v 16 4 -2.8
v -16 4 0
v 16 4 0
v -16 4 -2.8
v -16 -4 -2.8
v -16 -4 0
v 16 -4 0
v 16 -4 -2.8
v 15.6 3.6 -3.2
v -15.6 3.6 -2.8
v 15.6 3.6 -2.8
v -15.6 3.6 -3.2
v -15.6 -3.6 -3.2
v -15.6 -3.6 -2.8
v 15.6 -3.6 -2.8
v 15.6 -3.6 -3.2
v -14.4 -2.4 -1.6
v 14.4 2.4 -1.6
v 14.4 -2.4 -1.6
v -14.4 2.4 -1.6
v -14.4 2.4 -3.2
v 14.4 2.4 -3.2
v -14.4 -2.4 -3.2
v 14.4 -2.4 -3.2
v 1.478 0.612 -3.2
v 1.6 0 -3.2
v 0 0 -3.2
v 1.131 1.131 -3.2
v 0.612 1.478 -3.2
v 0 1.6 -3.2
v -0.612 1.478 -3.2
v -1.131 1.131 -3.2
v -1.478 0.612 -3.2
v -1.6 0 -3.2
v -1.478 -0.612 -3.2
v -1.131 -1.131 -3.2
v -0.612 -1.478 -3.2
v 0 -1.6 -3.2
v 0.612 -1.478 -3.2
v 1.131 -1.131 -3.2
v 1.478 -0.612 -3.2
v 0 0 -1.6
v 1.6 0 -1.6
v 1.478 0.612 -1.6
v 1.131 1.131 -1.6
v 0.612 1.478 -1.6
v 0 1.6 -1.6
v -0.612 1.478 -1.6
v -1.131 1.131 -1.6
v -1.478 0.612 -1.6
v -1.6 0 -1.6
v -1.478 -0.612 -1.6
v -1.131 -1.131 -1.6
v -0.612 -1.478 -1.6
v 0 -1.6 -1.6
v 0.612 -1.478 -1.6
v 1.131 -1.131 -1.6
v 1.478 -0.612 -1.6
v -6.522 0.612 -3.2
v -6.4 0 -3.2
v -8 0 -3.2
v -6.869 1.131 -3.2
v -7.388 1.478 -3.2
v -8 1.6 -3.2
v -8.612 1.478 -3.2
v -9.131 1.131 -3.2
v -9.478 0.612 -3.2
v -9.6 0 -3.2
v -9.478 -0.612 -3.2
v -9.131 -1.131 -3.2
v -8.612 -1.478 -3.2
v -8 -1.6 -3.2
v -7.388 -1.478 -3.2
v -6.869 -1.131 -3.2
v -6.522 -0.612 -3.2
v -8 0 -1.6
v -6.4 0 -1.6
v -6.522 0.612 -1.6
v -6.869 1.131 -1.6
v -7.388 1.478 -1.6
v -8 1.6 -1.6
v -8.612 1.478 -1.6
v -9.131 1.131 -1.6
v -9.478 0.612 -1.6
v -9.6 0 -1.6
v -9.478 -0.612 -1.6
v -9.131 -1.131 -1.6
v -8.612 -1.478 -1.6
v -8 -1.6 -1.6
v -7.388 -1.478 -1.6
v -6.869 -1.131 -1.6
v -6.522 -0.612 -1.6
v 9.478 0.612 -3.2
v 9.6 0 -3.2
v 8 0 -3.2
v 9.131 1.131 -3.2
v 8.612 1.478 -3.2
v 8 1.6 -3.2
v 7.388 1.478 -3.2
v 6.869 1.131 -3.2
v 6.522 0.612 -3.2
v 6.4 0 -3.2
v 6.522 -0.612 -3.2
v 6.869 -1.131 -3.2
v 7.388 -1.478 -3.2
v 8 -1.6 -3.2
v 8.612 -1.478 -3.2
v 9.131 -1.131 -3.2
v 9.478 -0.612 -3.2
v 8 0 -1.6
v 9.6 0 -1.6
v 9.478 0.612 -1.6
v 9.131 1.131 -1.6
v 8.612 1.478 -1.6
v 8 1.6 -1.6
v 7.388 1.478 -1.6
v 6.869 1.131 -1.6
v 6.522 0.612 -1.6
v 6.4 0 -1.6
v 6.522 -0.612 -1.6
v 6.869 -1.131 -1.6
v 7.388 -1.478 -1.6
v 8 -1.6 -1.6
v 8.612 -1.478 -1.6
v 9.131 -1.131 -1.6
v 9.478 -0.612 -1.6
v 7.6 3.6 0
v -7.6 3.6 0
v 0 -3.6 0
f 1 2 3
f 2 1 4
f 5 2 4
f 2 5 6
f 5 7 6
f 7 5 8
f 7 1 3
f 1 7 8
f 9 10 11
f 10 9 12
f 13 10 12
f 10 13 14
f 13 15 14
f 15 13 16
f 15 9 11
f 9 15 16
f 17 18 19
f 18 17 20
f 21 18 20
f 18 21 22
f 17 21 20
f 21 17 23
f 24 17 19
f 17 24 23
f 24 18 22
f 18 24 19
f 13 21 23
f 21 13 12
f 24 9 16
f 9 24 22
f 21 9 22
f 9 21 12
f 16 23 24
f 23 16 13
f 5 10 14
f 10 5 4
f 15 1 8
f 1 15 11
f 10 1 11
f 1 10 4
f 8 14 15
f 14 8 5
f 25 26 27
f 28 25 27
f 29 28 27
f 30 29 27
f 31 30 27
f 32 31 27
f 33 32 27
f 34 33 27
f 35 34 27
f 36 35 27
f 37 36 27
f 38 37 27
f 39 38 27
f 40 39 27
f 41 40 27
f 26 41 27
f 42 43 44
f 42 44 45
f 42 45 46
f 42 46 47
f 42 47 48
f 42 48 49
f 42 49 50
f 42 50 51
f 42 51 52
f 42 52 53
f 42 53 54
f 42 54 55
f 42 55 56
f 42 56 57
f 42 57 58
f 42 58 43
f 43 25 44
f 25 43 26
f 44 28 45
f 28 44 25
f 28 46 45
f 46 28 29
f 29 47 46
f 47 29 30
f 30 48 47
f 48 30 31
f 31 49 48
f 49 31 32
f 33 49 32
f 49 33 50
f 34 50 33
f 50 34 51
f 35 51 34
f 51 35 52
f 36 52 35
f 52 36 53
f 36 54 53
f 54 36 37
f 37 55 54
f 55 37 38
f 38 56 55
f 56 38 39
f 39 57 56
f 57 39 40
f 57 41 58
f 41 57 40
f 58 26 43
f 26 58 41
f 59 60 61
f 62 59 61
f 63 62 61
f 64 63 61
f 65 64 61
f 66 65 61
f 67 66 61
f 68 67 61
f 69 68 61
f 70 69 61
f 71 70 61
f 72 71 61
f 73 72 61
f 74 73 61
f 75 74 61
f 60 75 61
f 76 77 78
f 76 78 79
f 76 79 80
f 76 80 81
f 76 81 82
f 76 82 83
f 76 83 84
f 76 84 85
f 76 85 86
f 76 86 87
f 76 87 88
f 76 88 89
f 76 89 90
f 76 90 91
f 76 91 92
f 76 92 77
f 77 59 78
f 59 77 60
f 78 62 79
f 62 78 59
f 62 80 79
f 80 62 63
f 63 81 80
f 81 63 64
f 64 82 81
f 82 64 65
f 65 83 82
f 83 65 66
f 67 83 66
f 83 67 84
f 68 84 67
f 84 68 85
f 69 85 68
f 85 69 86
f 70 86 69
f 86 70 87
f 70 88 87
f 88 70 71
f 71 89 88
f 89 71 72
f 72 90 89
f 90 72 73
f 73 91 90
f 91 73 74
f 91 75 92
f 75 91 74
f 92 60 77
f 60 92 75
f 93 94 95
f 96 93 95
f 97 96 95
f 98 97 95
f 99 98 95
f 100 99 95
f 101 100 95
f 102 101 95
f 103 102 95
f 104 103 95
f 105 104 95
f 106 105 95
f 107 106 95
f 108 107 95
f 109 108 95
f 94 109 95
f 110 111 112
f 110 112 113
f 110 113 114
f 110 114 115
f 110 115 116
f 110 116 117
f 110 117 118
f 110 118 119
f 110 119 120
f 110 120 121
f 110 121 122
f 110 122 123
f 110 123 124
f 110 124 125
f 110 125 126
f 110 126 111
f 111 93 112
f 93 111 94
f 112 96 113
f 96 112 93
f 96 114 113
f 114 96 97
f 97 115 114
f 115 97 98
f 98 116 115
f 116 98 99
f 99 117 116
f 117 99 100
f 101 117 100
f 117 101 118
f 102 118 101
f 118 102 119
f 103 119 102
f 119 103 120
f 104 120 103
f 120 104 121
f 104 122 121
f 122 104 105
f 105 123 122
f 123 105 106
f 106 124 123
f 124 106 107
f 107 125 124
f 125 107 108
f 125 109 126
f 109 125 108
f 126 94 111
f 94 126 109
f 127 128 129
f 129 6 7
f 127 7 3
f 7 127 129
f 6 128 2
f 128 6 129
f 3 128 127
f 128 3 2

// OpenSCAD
// file: ../p/4-4edge.scad
use <../lib.scad>
function ldraw_lib__4_4edge() = [
// 0 Circle 1.0
// 0 Name: 4-4edge.dat
// 0 Author: James Jessiman
// 0 !LDRAW_ORG Primitive UPDATE 2017-01
// 0 !LICENSE Licensed under CC BY 2.0 and CC BY 4.0 : see CAreadme.txt
// 
// 0 BFC CERTIFY CCW
  [0,"BFC","CERTIFY"],
  [0,"BFC","CCW"],
// 
// 0 !HISTORY 1998-12-15 [PTadmin] Official Update 1998-10
// 0 !HISTORY 2005-12-28 [PTadmin] Official Update 2005-01
// 0 !HISTORY 2007-06-24 [PTadmin] Header formatted for Contributor Agreement
// 0 !HISTORY 2008-07-01 [PTadmin] Official Update 2008-01
// 0 !HISTORY 2017-01-15 [Steffen] BFCed
// 0 !HISTORY 2017-12-30 [PTadmin] Official Update 2017-01
// 
// 
// 2 24 1 0 0 0.9239 0 0.3827
  [2,24,1,0,0,0.9239,0,0.3827],
// 2 24 0.9239 0 0.3827 0.7071 0 0.7071
  [2,24,0.9239,0,0.3827,0.7071,0,0.7071],
// 2 24 0.7071 0 0.7071 0.3827 0 0.9239
  [2,24,0.7071,0,0.7071,0.3827,0,0.9239],
// 2 24 0.3827 0 0.9239 0 0 1
  [2,24,0.3827,0,0.9239,0,0,1],
// 2 24 0 0 1 -0.3827 0 0.9239
  [2,24,0,0,1,-0.3827,0,0.9239],
// 2 24 -0.3827 0 0.9239 -0.7071 0 0.7071
  [2,24,-0.3827,0,0.9239,-0.7071,0,0.7071],
// 2 24 -0.7071 0 0.7071 -0.9239 0 0.3827
  [2,24,-0.7071,0,0.7071,-0.9239,0,0.3827],
// 2 24 -0.9239 0 0.3827 -1 0 -0
  [2,24,-0.9239,0,0.3827,-1,0,-0],
// 2 24 -1 0 -0 -0.9239 0 -0.3827
  [2,24,-1,0,-0,-0.9239,0,-0.3827],
// 2 24 -0.9239 0 -0.3827 -0.7071 0 -0.7071
  [2,24,-0.9239,0,-0.3827,-0.7071,0,-0.7071],
// 2 24 -0.7071 0 -0.7071 -0.3827 0 -0.9239
  [2,24,-0.7071,0,-0.7071,-0.3827,0,-0.9239],
// 2 24 -0.3827 0 -0.9239 0 0 -1
  [2,24,-0.3827,0,-0.9239,0,0,-1],
// 2 24 0 0 -1 0.3827 0 -0.9239
  [2,24,0,0,-1,0.3827,0,-0.9239],
// 2 24 0.3827 0 -0.9239 0.7071 0 -0.7071
  [2,24,0.3827,0,-0.9239,0.7071,0,-0.7071],
// 2 24 0.7071 0 -0.7071 0.9239 0 -0.3827
  [2,24,0.7071,0,-0.7071,0.9239,0,-0.3827],
// 2 24 0.9239 0 -0.3827 1 0 0
  [2,24,0.9239,0,-0.3827,1,0,0],
];
module ldraw_lib__4_4edge(step=0, col=false, unit=2/5, alt=false, line=0.2, solid=!$preview)
    makepoly(ldraw_lib__4_4edge(), step=step, col=col, unit=unit, alt=alt, line=line, solid=solid);
ldraw_lib__4_4edge(line=0.2);
// file: ../p/4-4disc.scad
use <../lib.scad>
function ldraw_lib__4_4disc() = [
// 0 Disc 1.0
// 0 Name: 4-4disc.dat
// 0 Author: James Jessiman
// 0 !LDRAW_ORG Primitive UPDATE 2002-02
// 0 !LICENSE Licensed under CC BY 2.0 and CC BY 4.0 : see CAreadme.txt
// 
// 0 BFC CERTIFY CCW
  [0,"BFC","CERTIFY"],
  [0,"BFC","CCW"],
// 
// 0 !HISTORY 1998-12-15 [PTadmin] Official Update 1998-10
// 0 !HISTORY 2002-03-23 [sbliss] Added BFC statement
// 0 !HISTORY 2002-04-25 [PTadmin] Official Update 2002-02
// 0 !HISTORY 2007-06-24 [PTadmin] Header formatted for Contributor Agreement
// 0 !HISTORY 2008-07-01 [PTadmin] Official Update 2008-01
// 
// 
// 3 16 0 0 0 1 0 0 0.9239 0 0.3827
  [3,16,0,0,0,1,0,0,0.9239,0,0.3827],
// 3 16 0 0 0 0.9239 0 0.3827 0.7071 0 0.7071
  [3,16,0,0,0,0.9239,0,0.3827,0.7071,0,0.7071],
// 3 16 0 0 0 0.7071 0 0.7071 0.3827 0 0.9239
  [3,16,0,0,0,0.7071,0,0.7071,0.3827,0,0.9239],
// 3 16 0 0 0 0.3827 0 0.9239 0 0 1
  [3,16,0,0,0,0.3827,0,0.9239,0,0,1],
// 3 16 0 0 0 0 0 1 -0.3827 0 0.9239
  [3,16,0,0,0,0,0,1,-0.3827,0,0.9239],
// 3 16 0 0 0 -0.3827 0 0.9239 -0.7071 0 0.7071
  [3,16,0,0,0,-0.3827,0,0.9239,-0.7071,0,0.7071],
// 3 16 0 0 0 -0.7071 0 0.7071 -0.9239 0 0.3827
  [3,16,0,0,0,-0.7071,0,0.7071,-0.9239,0,0.3827],
// 3 16 0 0 0 -0.9239 0 0.3827 -1 0 -0
  [3,16,0,0,0,-0.9239,0,0.3827,-1,0,-0],
// 3 16 0 0 0 -1 0 -0 -0.9239 0 -0.3827
  [3,16,0,0,0,-1,0,-0,-0.9239,0,-0.3827],
// 3 16 0 0 0 -0.9239 0 -0.3827 -0.7071 0 -0.7071
  [3,16,0,0,0,-0.9239,0,-0.3827,-0.7071,0,-0.7071],
// 3 16 0 0 0 -0.7071 0 -0.7071 -0.3827 0 -0.9239
  [3,16,0,0,0,-0.7071,0,-0.7071,-0.3827,0,-0.9239],
// 3 16 0 0 0 -0.3827 0 -0.9239 0 0 -1
  [3,16,0,0,0,-0.3827,0,-0.9239,0,0,-1],
// 3 16 0 0 0 0 0 -1 0.3827 0 -0.9239
  [3,16,0,0,0,0,0,-1,0.3827,0,-0.9239],
// 3 16 0 0 0 0.3827 0 -0.9239 0.7071 0 -0.7071
  [3,16,0,0,0,0.3827,0,-0.9239,0.7071,0,-0.7071],
// 3 16 0 0 0 0.7071 0 -0.7071 0.9239 0 -0.3827
  [3,16,0,0,0,0.7071,0,-0.7071,0.9239,0,-0.3827],
// 3 16 0 0 0 0.9239 0 -0.3827 1 0 0
  [3,16,0,0,0,0.9239,0,-0.3827,1,0,0],
// 0
];
module ldraw_lib__4_4disc(step=0, col=false, unit=2/5, alt=false, line=0.2, solid=!$preview)
    makepoly(ldraw_lib__4_4disc(), step=step, col=col, unit=unit, alt=alt, line=line, solid=solid);
ldraw_lib__4_4disc(line=0.2);
// file: ../p/4-4cyli.scad
use <../lib.scad>
$fa=1; $fs=0.2;
function ldraw_lib__4_4cyli(realsolid=false) = [
// 0 Cylinder 1.0
// 0 Name: 4-4cyli.dat
// 0 Author: James Jessiman
// 0 !LDRAW_ORG Primitive UPDATE 2005-01
// 0 !LICENSE Licensed under CC BY 2.0 and CC BY 4.0 : see CAreadme.txt
// 
// 0 BFC CERTIFY CCW
  [0,"BFC","CERTIFY"],
  [0,"BFC","CCW"],
// 
// 0 !HISTORY 1998-12-15 [PTadmin] Official Update 1998-10
// 0 !HISTORY 2002-03-23 [sbliss] Added BFC statement; merged headers from files in distributions LDraw 0.27 and Complete.
// 0 !HISTORY 2002-04-25 [PTadmin] Official Update 2002-02
// 0 !HISTORY 2004-12-14 [guyvivan] BFC CCW
// 0 !HISTORY 2005-12-28 [PTadmin] Official Update 2005-01
// 0 !HISTORY 2007-06-24 [PTadmin] Header formatted for Contributor Agreement
// 0 !HISTORY 2008-07-01 [PTadmin] Official Update 2008-01
// 
// 
// 4 16 1 1 0 0.9239 1 0.3827 0.9239 0 0.3827 1 0 0
  [4,16,1,1,0,0.9239,1,0.3827,0.9239,0,0.3827,1,0,0],
// 5 24 1 0 0 1 1 0 0.9239 0 0.3827 0.9239 0 -0.3827
  [5,24,1,0,0,1,1,0,0.9239,0,0.3827,0.9239,0,-0.3827],
// 4 16 0.9239 1 0.3827 0.7071 1 0.7071 0.7071 0 0.7071 0.9239 0 0.3827
  [4,16,0.9239,1,0.3827,0.7071,1,0.7071,0.7071,0,0.7071,0.9239,0,0.3827],
// 5 24 0.9239 0 0.3827 0.9239 1 0.3827 0.7071 0 0.7071 1 0 0
  [5,24,0.9239,0,0.3827,0.9239,1,0.3827,0.7071,0,0.7071,1,0,0],
// 4 16 0.7071 1 0.7071 0.3827 1 0.9239 0.3827 0 0.9239 0.7071 0 0.7071
  [4,16,0.7071,1,0.7071,0.3827,1,0.9239,0.3827,0,0.9239,0.7071,0,0.7071],
// 5 24 0.7071 0 0.7071 0.7071 1 0.7071 0.3827 0 0.9239 0.9239 0 0.3827
  [5,24,0.7071,0,0.7071,0.7071,1,0.7071,0.3827,0,0.9239,0.9239,0,0.3827],
// 4 16 0.3827 1 0.9239 0 1 1 0 0 1 0.3827 0 0.9239
  [4,16,0.3827,1,0.9239,0,1,1,0,0,1,0.3827,0,0.9239],
// 5 24 0.3827 0 0.9239 0.3827 1 0.9239 0 0 1 0.7071 0 0.7071
  [5,24,0.3827,0,0.9239,0.3827,1,0.9239,0,0,1,0.7071,0,0.7071],
// 4 16 0 1 1 -0.3827 1 0.9239 -0.3827 0 0.9239 0 0 1
  [4,16,0,1,1,-0.3827,1,0.9239,-0.3827,0,0.9239,0,0,1],
// 5 24 0 0 1 0 1 1 -0.3827 0 0.9239 0.3827 0 0.9239
  [5,24,0,0,1,0,1,1,-0.3827,0,0.9239,0.3827,0,0.9239],
// 4 16 -0.3827 1 0.9239 -0.7071 1 0.7071 -0.7071 0 0.7071 -0.3827 0 0.9239
  [4,16,-0.3827,1,0.9239,-0.7071,1,0.7071,-0.7071,0,0.7071,-0.3827,0,0.9239],
// 5 24 -0.3827 0 0.9239 -0.3827 1 0.9239 -0.7071 0 0.7071 0 0 1
  [5,24,-0.3827,0,0.9239,-0.3827,1,0.9239,-0.7071,0,0.7071,0,0,1],
// 4 16 -0.7071 1 0.7071 -0.9239 1 0.3827 -0.9239 0 0.3827 -0.7071 0 0.7071
  [4,16,-0.7071,1,0.7071,-0.9239,1,0.3827,-0.9239,0,0.3827,-0.7071,0,0.7071],
// 5 24 -0.7071 0 0.7071 -0.7071 1 0.7071 -0.9239 0 0.3827 -0.3827 0 0.9239
  [5,24,-0.7071,0,0.7071,-0.7071,1,0.7071,-0.9239,0,0.3827,-0.3827,0,0.9239],
// 4 16 -0.9239 1 0.3827 -1 1 0 -1 0 0 -0.9239 0 0.3827
  [4,16,-0.9239,1,0.3827,-1,1,0,-1,0,0,-0.9239,0,0.3827],
// 5 24 -0.9239 0 0.3827 -0.9239 1 0.3827 -1 0 0 -0.7071 0 0.7071
  [5,24,-0.9239,0,0.3827,-0.9239,1,0.3827,-1,0,0,-0.7071,0,0.7071],
// 4 16 -1 1 0 -0.9239 1 -0.3827 -0.9239 0 -0.3827 -1 0 0
  [4,16,-1,1,0,-0.9239,1,-0.3827,-0.9239,0,-0.3827,-1,0,0],
// 5 24 -1 0 0 -1 1 0 -0.9239 0 -0.3827 -0.9239 0 0.3827
  [5,24,-1,0,0,-1,1,0,-0.9239,0,-0.3827,-0.9239,0,0.3827],
// 4 16 -0.9239 1 -0.3827 -0.7071 1 -0.7071 -0.7071 0 -0.7071 -0.9239 0 -0.3827
  [4,16,-0.9239,1,-0.3827,-0.7071,1,-0.7071,-0.7071,0,-0.7071,-0.9239,0,-0.3827],
// 5 24 -0.9239 0 -0.3827 -0.9239 1 -0.3827 -0.7071 0 -0.7071 -1 0 0
  [5,24,-0.9239,0,-0.3827,-0.9239,1,-0.3827,-0.7071,0,-0.7071,-1,0,0],
// 4 16 -0.7071 1 -0.7071 -0.3827 1 -0.9239 -0.3827 0 -0.9239 -0.7071 0 -0.7071
  [4,16,-0.7071,1,-0.7071,-0.3827,1,-0.9239,-0.3827,0,-0.9239,-0.7071,0,-0.7071],
// 5 24 -0.7071 0 -0.7071 -0.7071 1 -0.7071 -0.3827 0 -0.9239 -0.9239 0 -0.3827
  [5,24,-0.7071,0,-0.7071,-0.7071,1,-0.7071,-0.3827,0,-0.9239,-0.9239,0,-0.3827],
// 4 16 -0.3827 1 -0.9239 0 1 -1 0 0 -1 -0.3827 0 -0.9239
  [4,16,-0.3827,1,-0.9239,0,1,-1,0,0,-1,-0.3827,0,-0.9239],
// 5 24 -0.3827 0 -0.9239 -0.3827 1 -0.9239 0 0 -1 -0.7071 0 -0.7071
  [5,24,-0.3827,0,-0.9239,-0.3827,1,-0.9239,0,0,-1,-0.7071,0,-0.7071],
// 4 16 0 1 -1 0.3827 1 -0.9239 0.3827 0 -0.9239 0 0 -1
  [4,16,0,1,-1,0.3827,1,-0.9239,0.3827,0,-0.9239,0,0,-1],
// 5 24 0 0 -1 0 1 -1 0.3827 0 -0.9239 -0.3827 0 -0.9239
  [5,24,0,0,-1,0,1,-1,0.3827,0,-0.9239,-0.3827,0,-0.9239],
// 4 16 0.3827 1 -0.9239 0.7071 1 -0.7071 0.7071 0 -0.7071 0.3827 0 -0.9239
  [4,16,0.3827,1,-0.9239,0.7071,1,-0.7071,0.7071,0,-0.7071,0.3827,0,-0.9239],
// 5 24 0.3827 0 -0.9239 0.3827 1 -0.9239 0.7071 0 -0.7071 0 0 -1
  [5,24,0.3827,0,-0.9239,0.3827,1,-0.9239,0.7071,0,-0.7071,0,0,-1],
// 4 16 0.7071 1 -0.7071 0.9239 1 -0.3827 0.9239 0 -0.3827 0.7071 0 -0.7071
  [4,16,0.7071,1,-0.7071,0.9239,1,-0.3827,0.9239,0,-0.3827,0.7071,0,-0.7071],
// 5 24 0.7071 0 -0.7071 0.7071 1 -0.7071 0.9239 0 -0.3827 0.3827 0 -0.9239
  [5,24,0.7071,0,-0.7071,0.7071,1,-0.7071,0.9239,0,-0.3827,0.3827,0,-0.9239],
// 4 16 0.9239 1 -0.3827 1 1 0 1 0 0 0.9239 0 -0.3827
  [4,16,0.9239,1,-0.3827,1,1,0,1,0,0,0.9239,0,-0.3827],
// 5 24 0.9239 0 -0.3827 0.9239 1 -0.3827 1 0 0 0.7071 0 -0.7071
  [5,24,0.9239,0,-0.3827,0.9239,1,-0.3827,1,0,0,0.7071,0,-0.7071],
// 0
];
module ldraw_lib__4_4cyli(step=0, col=false, unit=2/5, alt=false, line=0.2, solid=!$preview)
    makepoly(ldraw_lib__4_4cyli(solid), step=step, col=col, unit=unit, alt=alt, line=line, solid=solid);
ldraw_lib__4_4cyli(line=0.2);
// file: ../p/stud3.scad
use <../lib.scad>
use <4-4cyli.scad>
use <4-4disc.scad>
use <4-4edge.scad>
function ldraw_lib__stud3() = [
// 0 Stud Tube Solid
// 0 Name: stud3.dat
// 0 Author: James Jessiman
// 0 !LDRAW_ORG Primitive UPDATE 2012-01
// 0 !LICENSE Licensed under CC BY 4.0 : see CAreadme.txt
// 
// 0 BFC CERTIFY CCW
  [0,"BFC","CERTIFY"],
  [0,"BFC","CCW"],
// 
// 0 !HISTORY 2002-04-04 [sbliss] Modified for BFC compliance
// 0 !HISTORY 2002-04-25 [PTadmin] Official Update 2002-02
// 0 !HISTORY 2007-06-24 [PTadmin] Header formatted for Contributor Agreement
// 0 !HISTORY 2008-07-01 [PTadmin] Official Update 2008-01
// 0 !HISTORY 2012-02-16 [Philo] Changed to CCW
// 0 !HISTORY 2012-03-30 [PTadmin] Official Update 2012-01
// 
// 
// 1 16 0 -4 0 4 0 0 0 1 0 0 0 4 4-4edge.dat
  [1,16,0,-4,0,4,0,0,0,1,0,0,0,4, ldraw_lib__4_4edge()],
// 1 16 0 0 0 4 0 0 0 1 0 0 0 4 4-4edge.dat
  [1,16,0,0,0,4,0,0,0,1,0,0,0,4, ldraw_lib__4_4edge()],
// 1 16 0 -4 0 4 0 0 0 1 0 0 0 4 4-4disc.dat
  [1,16,0,-4,0,4,0,0,0,1,0,0,0,4, ldraw_lib__4_4disc()],
  [-1,16,0,0,0,4,0,0,0,-1,0,0,0,4, ldraw_lib__4_4disc()],
// 1 16 0 -4 0 4 0 0 0 4 0 0 0 4 4-4cyli.dat
  [1,16,0,-4,0,4,0,0,0,4,0,0,0,4, ldraw_lib__4_4cyli()],
];
module ldraw_lib__stud3(step=0, col=false, unit=2/5, alt=false, line=0.2, solid=!$preview)
    makepoly(ldraw_lib__stud3(), step=step, col=col, unit=unit, alt=alt, line=line, solid=solid);
ldraw_lib__stud3(line=0.2);
// file: ../p/box5.scad
use <../lib.scad>
function ldraw_lib__box5() = [
// 0 Box with 5 Faces and All Edges
// 0 Name: box5.dat
// 0 Author: James Jessiman
// 0 !LDRAW_ORG Primitive UPDATE 2012-01
// 0 !LICENSE Licensed under CC BY 2.0 and CC BY 4.0 : see CAreadme.txt
// 
// 0 BFC CERTIFY CCW
  [0,"BFC","CERTIFY"],
  [0,"BFC","CCW"],
// 
// 0 !HISTORY 2002-04-03 [sbliss] Modified for BFC compliance
// 0 !HISTORY 2002-04-25 [PTadmin] Official Update 2002-02
// 0 !HISTORY 2007-06-24 [PTadmin] Header formatted for Contributor Agreement
// 0 !HISTORY 2008-07-01 [PTadmin] Official Update 2008-01
// 0 !HISTORY 2012-02-16 [Philo] Changed to CCW
// 0 !HISTORY 2012-03-30 [PTadmin] Official Update 2012-01
// 
// 
// 2 24 1 1 1 -1 1 1
  [2,24,1,1,1,-1,1,1],
// 2 24 -1 1 1 -1 1 -1
  [2,24,-1,1,1,-1,1,-1],
// 2 24 -1 1 -1 1 1 -1
  [2,24,-1,1,-1,1,1,-1],
// 2 24 1 1 -1 1 1 1
  [2,24,1,1,-1,1,1,1],
// 2 24 1 0 1 -1 0 1
  [2,24,1,0,1,-1,0,1],
// 2 24 -1 0 1 -1 0 -1
  [2,24,-1,0,1,-1,0,-1],
// 2 24 -1 0 -1 1 0 -1
  [2,24,-1,0,-1,1,0,-1],
// 2 24 1 0 -1 1 0 1
  [2,24,1,0,-1,1,0,1],
// 2 24 1 0 1 1 1 1
  [2,24,1,0,1,1,1,1],
// 2 24 -1 0 1 -1 1 1
  [2,24,-1,0,1,-1,1,1],
// 2 24 1 0 -1 1 1 -1
  [2,24,1,0,-1,1,1,-1],
// 2 24 -1 0 -1 -1 1 -1
  [2,24,-1,0,-1,-1,1,-1],
// 4 16 -1 1 1 1 1 1 1 1 -1 -1 1 -1
  [4,16,-1,1,1,1,1,1,1,1,-1,-1,1,-1],
// 4 16 -1 1 1 -1 0 1 1 0 1 1 1 1
  [4,16,-1,1,1,-1,0,1,1,0,1,1,1,1],
// 4 16 -1 1 -1 -1 0 -1 -1 0 1 -1 1 1
  [4,16,-1,1,-1,-1,0,-1,-1,0,1,-1,1,1],
// 4 16 1 1 -1 1 0 -1 -1 0 -1 -1 1 -1
  [4,16,1,1,-1,1,0,-1,-1,0,-1,-1,1,-1],
// 4 16 1 1 1 1 0 1 1 0 -1 1 1 -1
  [4,16,1,1,1,1,0,1,1,0,-1,1,1,-1],
];
makepoly(ldraw_lib__box5(), line=0.2);
// file: ../p/box4.scad
use <../lib.scad>
function ldraw_lib__box4() = [
// 0 Box with 4 Faces (2 Parallel Pairs) and All Edges
// 0 Name: box4.dat
// 0 Author: James Jessiman
// 0 !LDRAW_ORG Primitive UPDATE 2012-01
// 0 !LICENSE Licensed under CC BY 4.0 : see CAreadme.txt
// 
// 0 BFC CERTIFY CCW
  [0,"BFC","CERTIFY"],
  [0,"BFC","CCW"],
// 
// 0 !HISTORY 2002-04-03 [sbliss] Modified for BFC compliance
// 0 !HISTORY 2002-04-25 [PTadmin] Official Update 2002-02
// 0 !HISTORY 2007-06-24 [PTadmin] Header formatted for Contributor Agreement
// 0 !HISTORY 2008-07-01 [PTadmin] Official Update 2008-01
// 0 !HISTORY 2012-02-16 [Philo] Changed to CCW
// 0 !HISTORY 2012-03-30 [PTadmin] Official Update 2012-01
// 
// 
// 2 24 1 1 1 -1 1 1
  [2,24,1,1,1,-1,1,1],
// 2 24 -1 1 1 -1 1 -1
  [2,24,-1,1,1,-1,1,-1],
// 2 24 -1 1 -1 1 1 -1
  [2,24,-1,1,-1,1,1,-1],
// 2 24 1 1 -1 1 1 1
  [2,24,1,1,-1,1,1,1],
// 2 24 1 0 1 -1 0 1
  [2,24,1,0,1,-1,0,1],
// 2 24 -1 0 1 -1 0 -1
  [2,24,-1,0,1,-1,0,-1],
// 2 24 -1 0 -1 1 0 -1
  [2,24,-1,0,-1,1,0,-1],
// 2 24 1 0 -1 1 0 1
  [2,24,1,0,-1,1,0,1],
// 2 24 1 0 1 1 1 1
  [2,24,1,0,1,1,1,1],
// 2 24 -1 0 1 -1 1 1
  [2,24,-1,0,1,-1,1,1],
// 2 24 1 0 -1 1 1 -1
  [2,24,1,0,-1,1,1,-1],
// 2 24 -1 0 -1 -1 1 -1
  [2,24,-1,0,-1,-1,1,-1],
// 4 16 -1 1 1 -1 0 1 1 0 1 1 1 1
  [4,16,-1,1,1,-1,0,1,1,0,1,1,1,1],
// 4 16 -1 1 -1 -1 0 -1 -1 0 1 -1 1 1
  [4,16,-1,1,-1,-1,0,-1,-1,0,1,-1,1,1],
// 4 16 1 1 -1 1 0 -1 -1 0 -1 -1 1 -1
  [4,16,1,1,-1,1,0,-1,-1,0,-1,-1,1,-1],
// 4 16 1 1 1 1 0 1 1 0 -1 1 1 -1
  [4,16,1,1,1,1,0,1,1,0,-1,1,1,-1],
];
module ldraw_lib__box4(step=0, col=false, unit=2/5, alt=false, line=0.2, solid=!$preview)
    makepoly(ldraw_lib__box4(), step=step, col=col, unit=unit, alt=alt, line=line, solid=solid);
ldraw_lib__box4(line=0.2);
// file: s/2431s01.scad
use <../../lib.scad>
use <../../p/box4.scad>
use <../../p/box5.scad>
use <../../p/stud3.scad>
function ldraw_lib__s__2431s01() = [
// 0 ~Tile  1 x  4 with Groove without Top Face
// 0 Name: s\2431s01.dat
// 0 Author: Santeri Piippo [arezey]
// 0 !LDRAW_ORG Subpart UPDATE 2010-02
// 0 !LICENSE Licensed under CC BY 2.0 and CC BY 4.0 : see CAreadme.txt
// 
// 0 BFC CERTIFY CCW
  [0,"BFC","CERTIFY"],
  [0,"BFC","CCW"],
// 
// 0 !HISTORY 2010-07-05 [PTadmin] Official Update 2010-02
// 
// 
// 1 16 0 0 0 40 0 0 0 7 0 0 0 10 box4.dat
  [1,16,0,0,0,40,0,0,0,7,0,0,0,10, ldraw_lib__box4()],
// 1 16 0 7 0 39 0 0 0 1 0 0 0 9 box4.dat
  [1,16,0,7,0,39,0,0,0,1,0,0,0,9, ldraw_lib__box4()],
// 0 BFC INVERTNEXT
  [0,"BFC","INVERTNEXT"],
// 1 16 0 8 0 36 0 0 0 -4 0 0 0 6 box5.dat
  [1,16,0,8,0,36,0,0,0,-4,0,0,0,6, ldraw_lib__box5()],
// 4 16 -39 8 9 -36 8 6 -36 8 -6 -39 8 -9
  [4,16,-39,8,9,-36,8,6,-36,8,-6,-39,8,-9],
// 4 16 39 8 -9 36 8 -6 36 8 6 39 8 9
  [4,16,39,8,-9,36,8,-6,36,8,6,39,8,9],
// 4 16 39 8 9 36 8 6 -36 8 6 -39 8 9
  [4,16,39,8,9,36,8,6,-36,8,6,-39,8,9],
// 4 16 -39 8 -9 -36 8 -6 36 8 -6 39 8 -9
  [4,16,-39,8,-9,-36,8,-6,36,8,-6,39,8,-9],
// 4 16 -40 7 10 -39 7 9 -39 7 -9 -40 7 -10
  [4,16,-40,7,10,-39,7,9,-39,7,-9,-40,7,-10],
// 4 16 40 7 -10 39 7 -9 39 7 9 40 7 10
  [4,16,40,7,-10,39,7,-9,39,7,9,40,7,10],
// 4 16 40 7 10 39 7 9 -39 7 9 -40 7 10
  [4,16,40,7,10,39,7,9,-39,7,9,-40,7,10],
// 4 16 -40 7 -10 -39 7 -9 39 7 -9 40 7 -10
  [4,16,-40,7,-10,-39,7,-9,39,7,-9,40,7,-10],
// 1 16 0 4 0 1 0 0 0 -1 0 0 0 1 stud3.dat
  [1,16,0,4,0,1,0,0,0,-1,0,0,0,1, ldraw_lib__stud3()],
// 1 16 -20 4 0 1 0 0 0 -1 0 0 0 1 stud3.dat
  [1,16,-20,4,0,1,0,0,0,-1,0,0,0,1, ldraw_lib__stud3()],
// 1 16 20 4 0 1 0 0 0 -1 0 0 0 1 stud3.dat
  [1,16,20,4,0,1,0,0,0,-1,0,0,0,1, ldraw_lib__stud3()],
// 0 //
];
makepoly(ldraw_lib__s__2431s01(), line=0.2);
// main file
use <../lib.scad>
use <s/2431s01.scad>
function ldraw_lib__2431p80() = [
// 0 Tile  1 x  4 with Red Triangle Pattern
// 0 Name: 2431p80.dat
// 0 Author: Peter Grass [Evilspyre]
// 0 !LDRAW_ORG Shortcut UPDATE 2026-05
// 0 !LICENSE Licensed under CC BY 4.0 : see CAreadme.txt
// 
// 0 BFC CERTIFY CCW
  [0,"BFC","CERTIFY"],
  [0,"BFC","CCW"],
// 
// 0 !KEYWORDS Brickheadz, BrickLink 2431pb0862, Rebrickable 2431pr0204, Set 40672
// 0 !KEYWORDS Shadow the Hedgehog, Sonic
// 
// 0 !HISTORY 2025-09-29 [OrionP] Official Update 2025-09
// 0 !HISTORY 2025-12-27 [MagFors] Update description
// 0 !HISTORY 2026-05-31 [OrionP] Official Update 2026-05
// 
// 1 16 0 0 0 1 0 0 0 1 0 0 0 1 s\2431s01.dat
  [1,16,0,0,0,1,0,0,0,1,0,0,0,1, ldraw_lib__s__2431s01()],
// 3 4 19 0 9 -19 0 9 0 0 -9
  [3,4,19,0,9,-19,0,9,0,0,-9],
// 3 16 0 0 -9 -40 0 -10 40 0 -10
  [3,16,0,0,-9,-40,0,-10,40,0,-10],
// 4 16 40 0 10 19 0 9 0 0 -9 40 0 -10
  [4,16,40,0,10,19,0,9,0,0,-9,40,0,-10],
// 4 16 -19 0 9 -40 0 10 -40 0 -10 0 0 -9
  [4,16,-19,0,9,-40,0,10,-40,0,-10,0,0,-9],
// 4 16 -19 0 9 19 0 9 40 0 10 -40 0 10
  [4,16,-19,0,9,19,0,9,40,0,10,-40,0,10],
];
module ldraw_lib__2431p80(step=0, col=false, unit=2/5, alt=false, line=0.2, solid=!$preview)
    makepoly(ldraw_lib__2431p80(), step=step, col=col, unit=unit, alt=alt, line=line, solid=solid);
ldraw_lib__2431p80(line=0.2);
